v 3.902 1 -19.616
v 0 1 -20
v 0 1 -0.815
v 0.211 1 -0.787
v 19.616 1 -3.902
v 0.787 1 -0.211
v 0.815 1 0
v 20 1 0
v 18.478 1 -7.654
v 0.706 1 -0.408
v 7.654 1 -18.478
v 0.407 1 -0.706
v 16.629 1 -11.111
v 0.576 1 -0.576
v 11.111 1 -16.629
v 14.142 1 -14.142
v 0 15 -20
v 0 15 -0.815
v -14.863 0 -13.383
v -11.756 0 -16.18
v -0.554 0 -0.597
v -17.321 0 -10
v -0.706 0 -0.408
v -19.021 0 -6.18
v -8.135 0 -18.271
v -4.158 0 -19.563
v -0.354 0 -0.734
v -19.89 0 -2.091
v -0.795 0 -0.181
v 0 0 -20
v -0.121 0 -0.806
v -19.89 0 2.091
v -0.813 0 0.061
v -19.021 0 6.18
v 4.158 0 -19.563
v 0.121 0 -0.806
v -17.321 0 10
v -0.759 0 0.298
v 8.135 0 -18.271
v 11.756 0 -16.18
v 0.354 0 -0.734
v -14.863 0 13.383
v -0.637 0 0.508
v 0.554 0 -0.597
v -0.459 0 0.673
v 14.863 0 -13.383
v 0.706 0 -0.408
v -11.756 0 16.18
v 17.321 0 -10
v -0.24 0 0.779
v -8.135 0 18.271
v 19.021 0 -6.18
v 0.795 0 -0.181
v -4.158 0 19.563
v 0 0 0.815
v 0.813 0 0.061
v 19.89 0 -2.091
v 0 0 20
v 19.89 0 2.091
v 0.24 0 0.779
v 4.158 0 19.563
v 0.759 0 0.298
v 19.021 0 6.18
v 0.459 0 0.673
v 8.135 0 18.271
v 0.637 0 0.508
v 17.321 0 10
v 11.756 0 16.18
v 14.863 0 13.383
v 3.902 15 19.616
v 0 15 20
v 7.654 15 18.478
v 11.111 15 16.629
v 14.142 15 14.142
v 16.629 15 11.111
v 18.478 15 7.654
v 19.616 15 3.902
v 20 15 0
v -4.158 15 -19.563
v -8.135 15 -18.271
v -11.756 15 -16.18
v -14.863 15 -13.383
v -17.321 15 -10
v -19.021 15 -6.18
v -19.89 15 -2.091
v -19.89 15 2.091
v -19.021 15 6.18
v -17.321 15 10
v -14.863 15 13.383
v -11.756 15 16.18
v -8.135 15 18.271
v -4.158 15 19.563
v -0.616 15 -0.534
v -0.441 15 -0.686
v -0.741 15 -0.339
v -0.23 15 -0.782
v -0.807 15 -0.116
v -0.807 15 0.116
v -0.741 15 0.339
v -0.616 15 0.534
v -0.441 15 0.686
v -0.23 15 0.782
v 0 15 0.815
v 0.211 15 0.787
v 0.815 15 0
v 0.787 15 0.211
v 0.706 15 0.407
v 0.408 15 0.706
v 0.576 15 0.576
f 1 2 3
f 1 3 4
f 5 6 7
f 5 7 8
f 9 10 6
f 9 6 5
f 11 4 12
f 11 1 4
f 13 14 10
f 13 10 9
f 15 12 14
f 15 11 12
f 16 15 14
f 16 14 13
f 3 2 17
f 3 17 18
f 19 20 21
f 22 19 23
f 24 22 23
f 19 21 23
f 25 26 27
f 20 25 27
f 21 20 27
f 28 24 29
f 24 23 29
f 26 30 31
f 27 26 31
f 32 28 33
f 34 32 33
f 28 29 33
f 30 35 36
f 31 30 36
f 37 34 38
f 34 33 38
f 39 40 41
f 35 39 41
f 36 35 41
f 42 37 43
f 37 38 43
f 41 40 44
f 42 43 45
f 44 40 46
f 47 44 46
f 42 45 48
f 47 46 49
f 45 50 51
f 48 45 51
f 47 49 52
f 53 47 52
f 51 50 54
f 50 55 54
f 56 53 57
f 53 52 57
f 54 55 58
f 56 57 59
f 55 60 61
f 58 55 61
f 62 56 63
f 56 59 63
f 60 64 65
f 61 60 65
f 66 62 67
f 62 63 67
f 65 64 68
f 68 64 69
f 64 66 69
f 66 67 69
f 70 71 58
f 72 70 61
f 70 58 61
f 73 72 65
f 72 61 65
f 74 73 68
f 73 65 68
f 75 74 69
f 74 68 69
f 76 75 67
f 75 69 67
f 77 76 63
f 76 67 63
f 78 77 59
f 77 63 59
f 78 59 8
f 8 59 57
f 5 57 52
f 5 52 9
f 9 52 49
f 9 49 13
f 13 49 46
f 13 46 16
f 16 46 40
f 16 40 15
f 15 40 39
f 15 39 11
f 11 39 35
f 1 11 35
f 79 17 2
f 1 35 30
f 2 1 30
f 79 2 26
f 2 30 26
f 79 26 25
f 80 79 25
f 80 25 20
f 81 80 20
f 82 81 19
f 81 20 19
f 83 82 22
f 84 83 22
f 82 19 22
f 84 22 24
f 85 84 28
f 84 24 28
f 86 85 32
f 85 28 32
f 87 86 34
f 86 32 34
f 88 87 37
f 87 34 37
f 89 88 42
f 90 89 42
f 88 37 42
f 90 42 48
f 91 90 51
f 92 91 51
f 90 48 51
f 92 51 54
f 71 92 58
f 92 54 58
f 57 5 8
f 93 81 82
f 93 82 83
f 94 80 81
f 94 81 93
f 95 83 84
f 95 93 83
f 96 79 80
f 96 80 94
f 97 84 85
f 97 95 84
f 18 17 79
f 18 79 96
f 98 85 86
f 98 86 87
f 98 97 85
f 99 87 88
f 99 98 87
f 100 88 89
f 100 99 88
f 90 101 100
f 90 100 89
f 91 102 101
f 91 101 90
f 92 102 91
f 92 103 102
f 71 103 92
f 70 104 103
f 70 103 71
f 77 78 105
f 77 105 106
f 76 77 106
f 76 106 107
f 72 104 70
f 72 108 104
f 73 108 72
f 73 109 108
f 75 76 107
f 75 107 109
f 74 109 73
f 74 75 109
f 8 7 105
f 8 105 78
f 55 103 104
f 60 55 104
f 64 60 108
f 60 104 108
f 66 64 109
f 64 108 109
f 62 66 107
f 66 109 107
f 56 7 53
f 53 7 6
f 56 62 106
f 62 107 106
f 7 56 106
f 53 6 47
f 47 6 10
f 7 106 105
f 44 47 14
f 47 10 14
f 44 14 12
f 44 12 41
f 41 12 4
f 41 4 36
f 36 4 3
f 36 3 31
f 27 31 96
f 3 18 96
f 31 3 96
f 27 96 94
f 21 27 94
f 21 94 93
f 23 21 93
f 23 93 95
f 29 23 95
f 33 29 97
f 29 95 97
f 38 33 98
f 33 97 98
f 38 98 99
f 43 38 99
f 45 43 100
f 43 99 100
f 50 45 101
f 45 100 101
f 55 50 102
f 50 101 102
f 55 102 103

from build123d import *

# Parameters (mm, degrees)
SKETCH5_R           = 20
BOSS_EXTRUDE2_DEPTH = 15
CUT_EXTRUDE1_START  = -14
CUT_EXTRUDE1_DEPTH  = 14
SKETCH7_R           = 0.815
CUT_EXTRUDE2_DEPTH  = 150


with BuildPart() as part:
    # Sketch5 → Boss-Extrude2 (new body)
    with BuildSketch(Plane(origin=(0, 0, 0), x_dir=(1, 0, 0), z_dir=(0, 1, 0))):
        with Locations(Location((0, 0, 0), (0, 0, 270))):
            Circle(SKETCH5_R)
    extrude(amount=BOSS_EXTRUDE2_DEPTH)

    # Sketch6 → Cut-Extrude1 (cut)
    with BuildSketch(Plane(origin=(0, 15, 0), x_dir=(1, 0, 0), z_dir=(0, 1, 0)).offset(CUT_EXTRUDE1_START)):
        with BuildLine():
            Line((0, 20), (0, 0))
            Line((0, 0), (20, 0))
            ThreePointArc((20, 0), (14.142135624, 14.142135624), (0, 20))
        make_face()
    extrude(amount=CUT_EXTRUDE1_DEPTH, mode=Mode.SUBTRACT)

    # Sketch7 → Cut-Extrude2 (cut)
    with BuildSketch(Plane(origin=(0, 15, 0), x_dir=(1, 0, 0), z_dir=(0, 1, 0))):
        with Locations(Location((0, 0, 0), (0, 0, 270))):
            Circle(SKETCH7_R)
    extrude(amount=-CUT_EXTRUDE2_DEPTH, mode=Mode.SUBTRACT)


solid = part.part
